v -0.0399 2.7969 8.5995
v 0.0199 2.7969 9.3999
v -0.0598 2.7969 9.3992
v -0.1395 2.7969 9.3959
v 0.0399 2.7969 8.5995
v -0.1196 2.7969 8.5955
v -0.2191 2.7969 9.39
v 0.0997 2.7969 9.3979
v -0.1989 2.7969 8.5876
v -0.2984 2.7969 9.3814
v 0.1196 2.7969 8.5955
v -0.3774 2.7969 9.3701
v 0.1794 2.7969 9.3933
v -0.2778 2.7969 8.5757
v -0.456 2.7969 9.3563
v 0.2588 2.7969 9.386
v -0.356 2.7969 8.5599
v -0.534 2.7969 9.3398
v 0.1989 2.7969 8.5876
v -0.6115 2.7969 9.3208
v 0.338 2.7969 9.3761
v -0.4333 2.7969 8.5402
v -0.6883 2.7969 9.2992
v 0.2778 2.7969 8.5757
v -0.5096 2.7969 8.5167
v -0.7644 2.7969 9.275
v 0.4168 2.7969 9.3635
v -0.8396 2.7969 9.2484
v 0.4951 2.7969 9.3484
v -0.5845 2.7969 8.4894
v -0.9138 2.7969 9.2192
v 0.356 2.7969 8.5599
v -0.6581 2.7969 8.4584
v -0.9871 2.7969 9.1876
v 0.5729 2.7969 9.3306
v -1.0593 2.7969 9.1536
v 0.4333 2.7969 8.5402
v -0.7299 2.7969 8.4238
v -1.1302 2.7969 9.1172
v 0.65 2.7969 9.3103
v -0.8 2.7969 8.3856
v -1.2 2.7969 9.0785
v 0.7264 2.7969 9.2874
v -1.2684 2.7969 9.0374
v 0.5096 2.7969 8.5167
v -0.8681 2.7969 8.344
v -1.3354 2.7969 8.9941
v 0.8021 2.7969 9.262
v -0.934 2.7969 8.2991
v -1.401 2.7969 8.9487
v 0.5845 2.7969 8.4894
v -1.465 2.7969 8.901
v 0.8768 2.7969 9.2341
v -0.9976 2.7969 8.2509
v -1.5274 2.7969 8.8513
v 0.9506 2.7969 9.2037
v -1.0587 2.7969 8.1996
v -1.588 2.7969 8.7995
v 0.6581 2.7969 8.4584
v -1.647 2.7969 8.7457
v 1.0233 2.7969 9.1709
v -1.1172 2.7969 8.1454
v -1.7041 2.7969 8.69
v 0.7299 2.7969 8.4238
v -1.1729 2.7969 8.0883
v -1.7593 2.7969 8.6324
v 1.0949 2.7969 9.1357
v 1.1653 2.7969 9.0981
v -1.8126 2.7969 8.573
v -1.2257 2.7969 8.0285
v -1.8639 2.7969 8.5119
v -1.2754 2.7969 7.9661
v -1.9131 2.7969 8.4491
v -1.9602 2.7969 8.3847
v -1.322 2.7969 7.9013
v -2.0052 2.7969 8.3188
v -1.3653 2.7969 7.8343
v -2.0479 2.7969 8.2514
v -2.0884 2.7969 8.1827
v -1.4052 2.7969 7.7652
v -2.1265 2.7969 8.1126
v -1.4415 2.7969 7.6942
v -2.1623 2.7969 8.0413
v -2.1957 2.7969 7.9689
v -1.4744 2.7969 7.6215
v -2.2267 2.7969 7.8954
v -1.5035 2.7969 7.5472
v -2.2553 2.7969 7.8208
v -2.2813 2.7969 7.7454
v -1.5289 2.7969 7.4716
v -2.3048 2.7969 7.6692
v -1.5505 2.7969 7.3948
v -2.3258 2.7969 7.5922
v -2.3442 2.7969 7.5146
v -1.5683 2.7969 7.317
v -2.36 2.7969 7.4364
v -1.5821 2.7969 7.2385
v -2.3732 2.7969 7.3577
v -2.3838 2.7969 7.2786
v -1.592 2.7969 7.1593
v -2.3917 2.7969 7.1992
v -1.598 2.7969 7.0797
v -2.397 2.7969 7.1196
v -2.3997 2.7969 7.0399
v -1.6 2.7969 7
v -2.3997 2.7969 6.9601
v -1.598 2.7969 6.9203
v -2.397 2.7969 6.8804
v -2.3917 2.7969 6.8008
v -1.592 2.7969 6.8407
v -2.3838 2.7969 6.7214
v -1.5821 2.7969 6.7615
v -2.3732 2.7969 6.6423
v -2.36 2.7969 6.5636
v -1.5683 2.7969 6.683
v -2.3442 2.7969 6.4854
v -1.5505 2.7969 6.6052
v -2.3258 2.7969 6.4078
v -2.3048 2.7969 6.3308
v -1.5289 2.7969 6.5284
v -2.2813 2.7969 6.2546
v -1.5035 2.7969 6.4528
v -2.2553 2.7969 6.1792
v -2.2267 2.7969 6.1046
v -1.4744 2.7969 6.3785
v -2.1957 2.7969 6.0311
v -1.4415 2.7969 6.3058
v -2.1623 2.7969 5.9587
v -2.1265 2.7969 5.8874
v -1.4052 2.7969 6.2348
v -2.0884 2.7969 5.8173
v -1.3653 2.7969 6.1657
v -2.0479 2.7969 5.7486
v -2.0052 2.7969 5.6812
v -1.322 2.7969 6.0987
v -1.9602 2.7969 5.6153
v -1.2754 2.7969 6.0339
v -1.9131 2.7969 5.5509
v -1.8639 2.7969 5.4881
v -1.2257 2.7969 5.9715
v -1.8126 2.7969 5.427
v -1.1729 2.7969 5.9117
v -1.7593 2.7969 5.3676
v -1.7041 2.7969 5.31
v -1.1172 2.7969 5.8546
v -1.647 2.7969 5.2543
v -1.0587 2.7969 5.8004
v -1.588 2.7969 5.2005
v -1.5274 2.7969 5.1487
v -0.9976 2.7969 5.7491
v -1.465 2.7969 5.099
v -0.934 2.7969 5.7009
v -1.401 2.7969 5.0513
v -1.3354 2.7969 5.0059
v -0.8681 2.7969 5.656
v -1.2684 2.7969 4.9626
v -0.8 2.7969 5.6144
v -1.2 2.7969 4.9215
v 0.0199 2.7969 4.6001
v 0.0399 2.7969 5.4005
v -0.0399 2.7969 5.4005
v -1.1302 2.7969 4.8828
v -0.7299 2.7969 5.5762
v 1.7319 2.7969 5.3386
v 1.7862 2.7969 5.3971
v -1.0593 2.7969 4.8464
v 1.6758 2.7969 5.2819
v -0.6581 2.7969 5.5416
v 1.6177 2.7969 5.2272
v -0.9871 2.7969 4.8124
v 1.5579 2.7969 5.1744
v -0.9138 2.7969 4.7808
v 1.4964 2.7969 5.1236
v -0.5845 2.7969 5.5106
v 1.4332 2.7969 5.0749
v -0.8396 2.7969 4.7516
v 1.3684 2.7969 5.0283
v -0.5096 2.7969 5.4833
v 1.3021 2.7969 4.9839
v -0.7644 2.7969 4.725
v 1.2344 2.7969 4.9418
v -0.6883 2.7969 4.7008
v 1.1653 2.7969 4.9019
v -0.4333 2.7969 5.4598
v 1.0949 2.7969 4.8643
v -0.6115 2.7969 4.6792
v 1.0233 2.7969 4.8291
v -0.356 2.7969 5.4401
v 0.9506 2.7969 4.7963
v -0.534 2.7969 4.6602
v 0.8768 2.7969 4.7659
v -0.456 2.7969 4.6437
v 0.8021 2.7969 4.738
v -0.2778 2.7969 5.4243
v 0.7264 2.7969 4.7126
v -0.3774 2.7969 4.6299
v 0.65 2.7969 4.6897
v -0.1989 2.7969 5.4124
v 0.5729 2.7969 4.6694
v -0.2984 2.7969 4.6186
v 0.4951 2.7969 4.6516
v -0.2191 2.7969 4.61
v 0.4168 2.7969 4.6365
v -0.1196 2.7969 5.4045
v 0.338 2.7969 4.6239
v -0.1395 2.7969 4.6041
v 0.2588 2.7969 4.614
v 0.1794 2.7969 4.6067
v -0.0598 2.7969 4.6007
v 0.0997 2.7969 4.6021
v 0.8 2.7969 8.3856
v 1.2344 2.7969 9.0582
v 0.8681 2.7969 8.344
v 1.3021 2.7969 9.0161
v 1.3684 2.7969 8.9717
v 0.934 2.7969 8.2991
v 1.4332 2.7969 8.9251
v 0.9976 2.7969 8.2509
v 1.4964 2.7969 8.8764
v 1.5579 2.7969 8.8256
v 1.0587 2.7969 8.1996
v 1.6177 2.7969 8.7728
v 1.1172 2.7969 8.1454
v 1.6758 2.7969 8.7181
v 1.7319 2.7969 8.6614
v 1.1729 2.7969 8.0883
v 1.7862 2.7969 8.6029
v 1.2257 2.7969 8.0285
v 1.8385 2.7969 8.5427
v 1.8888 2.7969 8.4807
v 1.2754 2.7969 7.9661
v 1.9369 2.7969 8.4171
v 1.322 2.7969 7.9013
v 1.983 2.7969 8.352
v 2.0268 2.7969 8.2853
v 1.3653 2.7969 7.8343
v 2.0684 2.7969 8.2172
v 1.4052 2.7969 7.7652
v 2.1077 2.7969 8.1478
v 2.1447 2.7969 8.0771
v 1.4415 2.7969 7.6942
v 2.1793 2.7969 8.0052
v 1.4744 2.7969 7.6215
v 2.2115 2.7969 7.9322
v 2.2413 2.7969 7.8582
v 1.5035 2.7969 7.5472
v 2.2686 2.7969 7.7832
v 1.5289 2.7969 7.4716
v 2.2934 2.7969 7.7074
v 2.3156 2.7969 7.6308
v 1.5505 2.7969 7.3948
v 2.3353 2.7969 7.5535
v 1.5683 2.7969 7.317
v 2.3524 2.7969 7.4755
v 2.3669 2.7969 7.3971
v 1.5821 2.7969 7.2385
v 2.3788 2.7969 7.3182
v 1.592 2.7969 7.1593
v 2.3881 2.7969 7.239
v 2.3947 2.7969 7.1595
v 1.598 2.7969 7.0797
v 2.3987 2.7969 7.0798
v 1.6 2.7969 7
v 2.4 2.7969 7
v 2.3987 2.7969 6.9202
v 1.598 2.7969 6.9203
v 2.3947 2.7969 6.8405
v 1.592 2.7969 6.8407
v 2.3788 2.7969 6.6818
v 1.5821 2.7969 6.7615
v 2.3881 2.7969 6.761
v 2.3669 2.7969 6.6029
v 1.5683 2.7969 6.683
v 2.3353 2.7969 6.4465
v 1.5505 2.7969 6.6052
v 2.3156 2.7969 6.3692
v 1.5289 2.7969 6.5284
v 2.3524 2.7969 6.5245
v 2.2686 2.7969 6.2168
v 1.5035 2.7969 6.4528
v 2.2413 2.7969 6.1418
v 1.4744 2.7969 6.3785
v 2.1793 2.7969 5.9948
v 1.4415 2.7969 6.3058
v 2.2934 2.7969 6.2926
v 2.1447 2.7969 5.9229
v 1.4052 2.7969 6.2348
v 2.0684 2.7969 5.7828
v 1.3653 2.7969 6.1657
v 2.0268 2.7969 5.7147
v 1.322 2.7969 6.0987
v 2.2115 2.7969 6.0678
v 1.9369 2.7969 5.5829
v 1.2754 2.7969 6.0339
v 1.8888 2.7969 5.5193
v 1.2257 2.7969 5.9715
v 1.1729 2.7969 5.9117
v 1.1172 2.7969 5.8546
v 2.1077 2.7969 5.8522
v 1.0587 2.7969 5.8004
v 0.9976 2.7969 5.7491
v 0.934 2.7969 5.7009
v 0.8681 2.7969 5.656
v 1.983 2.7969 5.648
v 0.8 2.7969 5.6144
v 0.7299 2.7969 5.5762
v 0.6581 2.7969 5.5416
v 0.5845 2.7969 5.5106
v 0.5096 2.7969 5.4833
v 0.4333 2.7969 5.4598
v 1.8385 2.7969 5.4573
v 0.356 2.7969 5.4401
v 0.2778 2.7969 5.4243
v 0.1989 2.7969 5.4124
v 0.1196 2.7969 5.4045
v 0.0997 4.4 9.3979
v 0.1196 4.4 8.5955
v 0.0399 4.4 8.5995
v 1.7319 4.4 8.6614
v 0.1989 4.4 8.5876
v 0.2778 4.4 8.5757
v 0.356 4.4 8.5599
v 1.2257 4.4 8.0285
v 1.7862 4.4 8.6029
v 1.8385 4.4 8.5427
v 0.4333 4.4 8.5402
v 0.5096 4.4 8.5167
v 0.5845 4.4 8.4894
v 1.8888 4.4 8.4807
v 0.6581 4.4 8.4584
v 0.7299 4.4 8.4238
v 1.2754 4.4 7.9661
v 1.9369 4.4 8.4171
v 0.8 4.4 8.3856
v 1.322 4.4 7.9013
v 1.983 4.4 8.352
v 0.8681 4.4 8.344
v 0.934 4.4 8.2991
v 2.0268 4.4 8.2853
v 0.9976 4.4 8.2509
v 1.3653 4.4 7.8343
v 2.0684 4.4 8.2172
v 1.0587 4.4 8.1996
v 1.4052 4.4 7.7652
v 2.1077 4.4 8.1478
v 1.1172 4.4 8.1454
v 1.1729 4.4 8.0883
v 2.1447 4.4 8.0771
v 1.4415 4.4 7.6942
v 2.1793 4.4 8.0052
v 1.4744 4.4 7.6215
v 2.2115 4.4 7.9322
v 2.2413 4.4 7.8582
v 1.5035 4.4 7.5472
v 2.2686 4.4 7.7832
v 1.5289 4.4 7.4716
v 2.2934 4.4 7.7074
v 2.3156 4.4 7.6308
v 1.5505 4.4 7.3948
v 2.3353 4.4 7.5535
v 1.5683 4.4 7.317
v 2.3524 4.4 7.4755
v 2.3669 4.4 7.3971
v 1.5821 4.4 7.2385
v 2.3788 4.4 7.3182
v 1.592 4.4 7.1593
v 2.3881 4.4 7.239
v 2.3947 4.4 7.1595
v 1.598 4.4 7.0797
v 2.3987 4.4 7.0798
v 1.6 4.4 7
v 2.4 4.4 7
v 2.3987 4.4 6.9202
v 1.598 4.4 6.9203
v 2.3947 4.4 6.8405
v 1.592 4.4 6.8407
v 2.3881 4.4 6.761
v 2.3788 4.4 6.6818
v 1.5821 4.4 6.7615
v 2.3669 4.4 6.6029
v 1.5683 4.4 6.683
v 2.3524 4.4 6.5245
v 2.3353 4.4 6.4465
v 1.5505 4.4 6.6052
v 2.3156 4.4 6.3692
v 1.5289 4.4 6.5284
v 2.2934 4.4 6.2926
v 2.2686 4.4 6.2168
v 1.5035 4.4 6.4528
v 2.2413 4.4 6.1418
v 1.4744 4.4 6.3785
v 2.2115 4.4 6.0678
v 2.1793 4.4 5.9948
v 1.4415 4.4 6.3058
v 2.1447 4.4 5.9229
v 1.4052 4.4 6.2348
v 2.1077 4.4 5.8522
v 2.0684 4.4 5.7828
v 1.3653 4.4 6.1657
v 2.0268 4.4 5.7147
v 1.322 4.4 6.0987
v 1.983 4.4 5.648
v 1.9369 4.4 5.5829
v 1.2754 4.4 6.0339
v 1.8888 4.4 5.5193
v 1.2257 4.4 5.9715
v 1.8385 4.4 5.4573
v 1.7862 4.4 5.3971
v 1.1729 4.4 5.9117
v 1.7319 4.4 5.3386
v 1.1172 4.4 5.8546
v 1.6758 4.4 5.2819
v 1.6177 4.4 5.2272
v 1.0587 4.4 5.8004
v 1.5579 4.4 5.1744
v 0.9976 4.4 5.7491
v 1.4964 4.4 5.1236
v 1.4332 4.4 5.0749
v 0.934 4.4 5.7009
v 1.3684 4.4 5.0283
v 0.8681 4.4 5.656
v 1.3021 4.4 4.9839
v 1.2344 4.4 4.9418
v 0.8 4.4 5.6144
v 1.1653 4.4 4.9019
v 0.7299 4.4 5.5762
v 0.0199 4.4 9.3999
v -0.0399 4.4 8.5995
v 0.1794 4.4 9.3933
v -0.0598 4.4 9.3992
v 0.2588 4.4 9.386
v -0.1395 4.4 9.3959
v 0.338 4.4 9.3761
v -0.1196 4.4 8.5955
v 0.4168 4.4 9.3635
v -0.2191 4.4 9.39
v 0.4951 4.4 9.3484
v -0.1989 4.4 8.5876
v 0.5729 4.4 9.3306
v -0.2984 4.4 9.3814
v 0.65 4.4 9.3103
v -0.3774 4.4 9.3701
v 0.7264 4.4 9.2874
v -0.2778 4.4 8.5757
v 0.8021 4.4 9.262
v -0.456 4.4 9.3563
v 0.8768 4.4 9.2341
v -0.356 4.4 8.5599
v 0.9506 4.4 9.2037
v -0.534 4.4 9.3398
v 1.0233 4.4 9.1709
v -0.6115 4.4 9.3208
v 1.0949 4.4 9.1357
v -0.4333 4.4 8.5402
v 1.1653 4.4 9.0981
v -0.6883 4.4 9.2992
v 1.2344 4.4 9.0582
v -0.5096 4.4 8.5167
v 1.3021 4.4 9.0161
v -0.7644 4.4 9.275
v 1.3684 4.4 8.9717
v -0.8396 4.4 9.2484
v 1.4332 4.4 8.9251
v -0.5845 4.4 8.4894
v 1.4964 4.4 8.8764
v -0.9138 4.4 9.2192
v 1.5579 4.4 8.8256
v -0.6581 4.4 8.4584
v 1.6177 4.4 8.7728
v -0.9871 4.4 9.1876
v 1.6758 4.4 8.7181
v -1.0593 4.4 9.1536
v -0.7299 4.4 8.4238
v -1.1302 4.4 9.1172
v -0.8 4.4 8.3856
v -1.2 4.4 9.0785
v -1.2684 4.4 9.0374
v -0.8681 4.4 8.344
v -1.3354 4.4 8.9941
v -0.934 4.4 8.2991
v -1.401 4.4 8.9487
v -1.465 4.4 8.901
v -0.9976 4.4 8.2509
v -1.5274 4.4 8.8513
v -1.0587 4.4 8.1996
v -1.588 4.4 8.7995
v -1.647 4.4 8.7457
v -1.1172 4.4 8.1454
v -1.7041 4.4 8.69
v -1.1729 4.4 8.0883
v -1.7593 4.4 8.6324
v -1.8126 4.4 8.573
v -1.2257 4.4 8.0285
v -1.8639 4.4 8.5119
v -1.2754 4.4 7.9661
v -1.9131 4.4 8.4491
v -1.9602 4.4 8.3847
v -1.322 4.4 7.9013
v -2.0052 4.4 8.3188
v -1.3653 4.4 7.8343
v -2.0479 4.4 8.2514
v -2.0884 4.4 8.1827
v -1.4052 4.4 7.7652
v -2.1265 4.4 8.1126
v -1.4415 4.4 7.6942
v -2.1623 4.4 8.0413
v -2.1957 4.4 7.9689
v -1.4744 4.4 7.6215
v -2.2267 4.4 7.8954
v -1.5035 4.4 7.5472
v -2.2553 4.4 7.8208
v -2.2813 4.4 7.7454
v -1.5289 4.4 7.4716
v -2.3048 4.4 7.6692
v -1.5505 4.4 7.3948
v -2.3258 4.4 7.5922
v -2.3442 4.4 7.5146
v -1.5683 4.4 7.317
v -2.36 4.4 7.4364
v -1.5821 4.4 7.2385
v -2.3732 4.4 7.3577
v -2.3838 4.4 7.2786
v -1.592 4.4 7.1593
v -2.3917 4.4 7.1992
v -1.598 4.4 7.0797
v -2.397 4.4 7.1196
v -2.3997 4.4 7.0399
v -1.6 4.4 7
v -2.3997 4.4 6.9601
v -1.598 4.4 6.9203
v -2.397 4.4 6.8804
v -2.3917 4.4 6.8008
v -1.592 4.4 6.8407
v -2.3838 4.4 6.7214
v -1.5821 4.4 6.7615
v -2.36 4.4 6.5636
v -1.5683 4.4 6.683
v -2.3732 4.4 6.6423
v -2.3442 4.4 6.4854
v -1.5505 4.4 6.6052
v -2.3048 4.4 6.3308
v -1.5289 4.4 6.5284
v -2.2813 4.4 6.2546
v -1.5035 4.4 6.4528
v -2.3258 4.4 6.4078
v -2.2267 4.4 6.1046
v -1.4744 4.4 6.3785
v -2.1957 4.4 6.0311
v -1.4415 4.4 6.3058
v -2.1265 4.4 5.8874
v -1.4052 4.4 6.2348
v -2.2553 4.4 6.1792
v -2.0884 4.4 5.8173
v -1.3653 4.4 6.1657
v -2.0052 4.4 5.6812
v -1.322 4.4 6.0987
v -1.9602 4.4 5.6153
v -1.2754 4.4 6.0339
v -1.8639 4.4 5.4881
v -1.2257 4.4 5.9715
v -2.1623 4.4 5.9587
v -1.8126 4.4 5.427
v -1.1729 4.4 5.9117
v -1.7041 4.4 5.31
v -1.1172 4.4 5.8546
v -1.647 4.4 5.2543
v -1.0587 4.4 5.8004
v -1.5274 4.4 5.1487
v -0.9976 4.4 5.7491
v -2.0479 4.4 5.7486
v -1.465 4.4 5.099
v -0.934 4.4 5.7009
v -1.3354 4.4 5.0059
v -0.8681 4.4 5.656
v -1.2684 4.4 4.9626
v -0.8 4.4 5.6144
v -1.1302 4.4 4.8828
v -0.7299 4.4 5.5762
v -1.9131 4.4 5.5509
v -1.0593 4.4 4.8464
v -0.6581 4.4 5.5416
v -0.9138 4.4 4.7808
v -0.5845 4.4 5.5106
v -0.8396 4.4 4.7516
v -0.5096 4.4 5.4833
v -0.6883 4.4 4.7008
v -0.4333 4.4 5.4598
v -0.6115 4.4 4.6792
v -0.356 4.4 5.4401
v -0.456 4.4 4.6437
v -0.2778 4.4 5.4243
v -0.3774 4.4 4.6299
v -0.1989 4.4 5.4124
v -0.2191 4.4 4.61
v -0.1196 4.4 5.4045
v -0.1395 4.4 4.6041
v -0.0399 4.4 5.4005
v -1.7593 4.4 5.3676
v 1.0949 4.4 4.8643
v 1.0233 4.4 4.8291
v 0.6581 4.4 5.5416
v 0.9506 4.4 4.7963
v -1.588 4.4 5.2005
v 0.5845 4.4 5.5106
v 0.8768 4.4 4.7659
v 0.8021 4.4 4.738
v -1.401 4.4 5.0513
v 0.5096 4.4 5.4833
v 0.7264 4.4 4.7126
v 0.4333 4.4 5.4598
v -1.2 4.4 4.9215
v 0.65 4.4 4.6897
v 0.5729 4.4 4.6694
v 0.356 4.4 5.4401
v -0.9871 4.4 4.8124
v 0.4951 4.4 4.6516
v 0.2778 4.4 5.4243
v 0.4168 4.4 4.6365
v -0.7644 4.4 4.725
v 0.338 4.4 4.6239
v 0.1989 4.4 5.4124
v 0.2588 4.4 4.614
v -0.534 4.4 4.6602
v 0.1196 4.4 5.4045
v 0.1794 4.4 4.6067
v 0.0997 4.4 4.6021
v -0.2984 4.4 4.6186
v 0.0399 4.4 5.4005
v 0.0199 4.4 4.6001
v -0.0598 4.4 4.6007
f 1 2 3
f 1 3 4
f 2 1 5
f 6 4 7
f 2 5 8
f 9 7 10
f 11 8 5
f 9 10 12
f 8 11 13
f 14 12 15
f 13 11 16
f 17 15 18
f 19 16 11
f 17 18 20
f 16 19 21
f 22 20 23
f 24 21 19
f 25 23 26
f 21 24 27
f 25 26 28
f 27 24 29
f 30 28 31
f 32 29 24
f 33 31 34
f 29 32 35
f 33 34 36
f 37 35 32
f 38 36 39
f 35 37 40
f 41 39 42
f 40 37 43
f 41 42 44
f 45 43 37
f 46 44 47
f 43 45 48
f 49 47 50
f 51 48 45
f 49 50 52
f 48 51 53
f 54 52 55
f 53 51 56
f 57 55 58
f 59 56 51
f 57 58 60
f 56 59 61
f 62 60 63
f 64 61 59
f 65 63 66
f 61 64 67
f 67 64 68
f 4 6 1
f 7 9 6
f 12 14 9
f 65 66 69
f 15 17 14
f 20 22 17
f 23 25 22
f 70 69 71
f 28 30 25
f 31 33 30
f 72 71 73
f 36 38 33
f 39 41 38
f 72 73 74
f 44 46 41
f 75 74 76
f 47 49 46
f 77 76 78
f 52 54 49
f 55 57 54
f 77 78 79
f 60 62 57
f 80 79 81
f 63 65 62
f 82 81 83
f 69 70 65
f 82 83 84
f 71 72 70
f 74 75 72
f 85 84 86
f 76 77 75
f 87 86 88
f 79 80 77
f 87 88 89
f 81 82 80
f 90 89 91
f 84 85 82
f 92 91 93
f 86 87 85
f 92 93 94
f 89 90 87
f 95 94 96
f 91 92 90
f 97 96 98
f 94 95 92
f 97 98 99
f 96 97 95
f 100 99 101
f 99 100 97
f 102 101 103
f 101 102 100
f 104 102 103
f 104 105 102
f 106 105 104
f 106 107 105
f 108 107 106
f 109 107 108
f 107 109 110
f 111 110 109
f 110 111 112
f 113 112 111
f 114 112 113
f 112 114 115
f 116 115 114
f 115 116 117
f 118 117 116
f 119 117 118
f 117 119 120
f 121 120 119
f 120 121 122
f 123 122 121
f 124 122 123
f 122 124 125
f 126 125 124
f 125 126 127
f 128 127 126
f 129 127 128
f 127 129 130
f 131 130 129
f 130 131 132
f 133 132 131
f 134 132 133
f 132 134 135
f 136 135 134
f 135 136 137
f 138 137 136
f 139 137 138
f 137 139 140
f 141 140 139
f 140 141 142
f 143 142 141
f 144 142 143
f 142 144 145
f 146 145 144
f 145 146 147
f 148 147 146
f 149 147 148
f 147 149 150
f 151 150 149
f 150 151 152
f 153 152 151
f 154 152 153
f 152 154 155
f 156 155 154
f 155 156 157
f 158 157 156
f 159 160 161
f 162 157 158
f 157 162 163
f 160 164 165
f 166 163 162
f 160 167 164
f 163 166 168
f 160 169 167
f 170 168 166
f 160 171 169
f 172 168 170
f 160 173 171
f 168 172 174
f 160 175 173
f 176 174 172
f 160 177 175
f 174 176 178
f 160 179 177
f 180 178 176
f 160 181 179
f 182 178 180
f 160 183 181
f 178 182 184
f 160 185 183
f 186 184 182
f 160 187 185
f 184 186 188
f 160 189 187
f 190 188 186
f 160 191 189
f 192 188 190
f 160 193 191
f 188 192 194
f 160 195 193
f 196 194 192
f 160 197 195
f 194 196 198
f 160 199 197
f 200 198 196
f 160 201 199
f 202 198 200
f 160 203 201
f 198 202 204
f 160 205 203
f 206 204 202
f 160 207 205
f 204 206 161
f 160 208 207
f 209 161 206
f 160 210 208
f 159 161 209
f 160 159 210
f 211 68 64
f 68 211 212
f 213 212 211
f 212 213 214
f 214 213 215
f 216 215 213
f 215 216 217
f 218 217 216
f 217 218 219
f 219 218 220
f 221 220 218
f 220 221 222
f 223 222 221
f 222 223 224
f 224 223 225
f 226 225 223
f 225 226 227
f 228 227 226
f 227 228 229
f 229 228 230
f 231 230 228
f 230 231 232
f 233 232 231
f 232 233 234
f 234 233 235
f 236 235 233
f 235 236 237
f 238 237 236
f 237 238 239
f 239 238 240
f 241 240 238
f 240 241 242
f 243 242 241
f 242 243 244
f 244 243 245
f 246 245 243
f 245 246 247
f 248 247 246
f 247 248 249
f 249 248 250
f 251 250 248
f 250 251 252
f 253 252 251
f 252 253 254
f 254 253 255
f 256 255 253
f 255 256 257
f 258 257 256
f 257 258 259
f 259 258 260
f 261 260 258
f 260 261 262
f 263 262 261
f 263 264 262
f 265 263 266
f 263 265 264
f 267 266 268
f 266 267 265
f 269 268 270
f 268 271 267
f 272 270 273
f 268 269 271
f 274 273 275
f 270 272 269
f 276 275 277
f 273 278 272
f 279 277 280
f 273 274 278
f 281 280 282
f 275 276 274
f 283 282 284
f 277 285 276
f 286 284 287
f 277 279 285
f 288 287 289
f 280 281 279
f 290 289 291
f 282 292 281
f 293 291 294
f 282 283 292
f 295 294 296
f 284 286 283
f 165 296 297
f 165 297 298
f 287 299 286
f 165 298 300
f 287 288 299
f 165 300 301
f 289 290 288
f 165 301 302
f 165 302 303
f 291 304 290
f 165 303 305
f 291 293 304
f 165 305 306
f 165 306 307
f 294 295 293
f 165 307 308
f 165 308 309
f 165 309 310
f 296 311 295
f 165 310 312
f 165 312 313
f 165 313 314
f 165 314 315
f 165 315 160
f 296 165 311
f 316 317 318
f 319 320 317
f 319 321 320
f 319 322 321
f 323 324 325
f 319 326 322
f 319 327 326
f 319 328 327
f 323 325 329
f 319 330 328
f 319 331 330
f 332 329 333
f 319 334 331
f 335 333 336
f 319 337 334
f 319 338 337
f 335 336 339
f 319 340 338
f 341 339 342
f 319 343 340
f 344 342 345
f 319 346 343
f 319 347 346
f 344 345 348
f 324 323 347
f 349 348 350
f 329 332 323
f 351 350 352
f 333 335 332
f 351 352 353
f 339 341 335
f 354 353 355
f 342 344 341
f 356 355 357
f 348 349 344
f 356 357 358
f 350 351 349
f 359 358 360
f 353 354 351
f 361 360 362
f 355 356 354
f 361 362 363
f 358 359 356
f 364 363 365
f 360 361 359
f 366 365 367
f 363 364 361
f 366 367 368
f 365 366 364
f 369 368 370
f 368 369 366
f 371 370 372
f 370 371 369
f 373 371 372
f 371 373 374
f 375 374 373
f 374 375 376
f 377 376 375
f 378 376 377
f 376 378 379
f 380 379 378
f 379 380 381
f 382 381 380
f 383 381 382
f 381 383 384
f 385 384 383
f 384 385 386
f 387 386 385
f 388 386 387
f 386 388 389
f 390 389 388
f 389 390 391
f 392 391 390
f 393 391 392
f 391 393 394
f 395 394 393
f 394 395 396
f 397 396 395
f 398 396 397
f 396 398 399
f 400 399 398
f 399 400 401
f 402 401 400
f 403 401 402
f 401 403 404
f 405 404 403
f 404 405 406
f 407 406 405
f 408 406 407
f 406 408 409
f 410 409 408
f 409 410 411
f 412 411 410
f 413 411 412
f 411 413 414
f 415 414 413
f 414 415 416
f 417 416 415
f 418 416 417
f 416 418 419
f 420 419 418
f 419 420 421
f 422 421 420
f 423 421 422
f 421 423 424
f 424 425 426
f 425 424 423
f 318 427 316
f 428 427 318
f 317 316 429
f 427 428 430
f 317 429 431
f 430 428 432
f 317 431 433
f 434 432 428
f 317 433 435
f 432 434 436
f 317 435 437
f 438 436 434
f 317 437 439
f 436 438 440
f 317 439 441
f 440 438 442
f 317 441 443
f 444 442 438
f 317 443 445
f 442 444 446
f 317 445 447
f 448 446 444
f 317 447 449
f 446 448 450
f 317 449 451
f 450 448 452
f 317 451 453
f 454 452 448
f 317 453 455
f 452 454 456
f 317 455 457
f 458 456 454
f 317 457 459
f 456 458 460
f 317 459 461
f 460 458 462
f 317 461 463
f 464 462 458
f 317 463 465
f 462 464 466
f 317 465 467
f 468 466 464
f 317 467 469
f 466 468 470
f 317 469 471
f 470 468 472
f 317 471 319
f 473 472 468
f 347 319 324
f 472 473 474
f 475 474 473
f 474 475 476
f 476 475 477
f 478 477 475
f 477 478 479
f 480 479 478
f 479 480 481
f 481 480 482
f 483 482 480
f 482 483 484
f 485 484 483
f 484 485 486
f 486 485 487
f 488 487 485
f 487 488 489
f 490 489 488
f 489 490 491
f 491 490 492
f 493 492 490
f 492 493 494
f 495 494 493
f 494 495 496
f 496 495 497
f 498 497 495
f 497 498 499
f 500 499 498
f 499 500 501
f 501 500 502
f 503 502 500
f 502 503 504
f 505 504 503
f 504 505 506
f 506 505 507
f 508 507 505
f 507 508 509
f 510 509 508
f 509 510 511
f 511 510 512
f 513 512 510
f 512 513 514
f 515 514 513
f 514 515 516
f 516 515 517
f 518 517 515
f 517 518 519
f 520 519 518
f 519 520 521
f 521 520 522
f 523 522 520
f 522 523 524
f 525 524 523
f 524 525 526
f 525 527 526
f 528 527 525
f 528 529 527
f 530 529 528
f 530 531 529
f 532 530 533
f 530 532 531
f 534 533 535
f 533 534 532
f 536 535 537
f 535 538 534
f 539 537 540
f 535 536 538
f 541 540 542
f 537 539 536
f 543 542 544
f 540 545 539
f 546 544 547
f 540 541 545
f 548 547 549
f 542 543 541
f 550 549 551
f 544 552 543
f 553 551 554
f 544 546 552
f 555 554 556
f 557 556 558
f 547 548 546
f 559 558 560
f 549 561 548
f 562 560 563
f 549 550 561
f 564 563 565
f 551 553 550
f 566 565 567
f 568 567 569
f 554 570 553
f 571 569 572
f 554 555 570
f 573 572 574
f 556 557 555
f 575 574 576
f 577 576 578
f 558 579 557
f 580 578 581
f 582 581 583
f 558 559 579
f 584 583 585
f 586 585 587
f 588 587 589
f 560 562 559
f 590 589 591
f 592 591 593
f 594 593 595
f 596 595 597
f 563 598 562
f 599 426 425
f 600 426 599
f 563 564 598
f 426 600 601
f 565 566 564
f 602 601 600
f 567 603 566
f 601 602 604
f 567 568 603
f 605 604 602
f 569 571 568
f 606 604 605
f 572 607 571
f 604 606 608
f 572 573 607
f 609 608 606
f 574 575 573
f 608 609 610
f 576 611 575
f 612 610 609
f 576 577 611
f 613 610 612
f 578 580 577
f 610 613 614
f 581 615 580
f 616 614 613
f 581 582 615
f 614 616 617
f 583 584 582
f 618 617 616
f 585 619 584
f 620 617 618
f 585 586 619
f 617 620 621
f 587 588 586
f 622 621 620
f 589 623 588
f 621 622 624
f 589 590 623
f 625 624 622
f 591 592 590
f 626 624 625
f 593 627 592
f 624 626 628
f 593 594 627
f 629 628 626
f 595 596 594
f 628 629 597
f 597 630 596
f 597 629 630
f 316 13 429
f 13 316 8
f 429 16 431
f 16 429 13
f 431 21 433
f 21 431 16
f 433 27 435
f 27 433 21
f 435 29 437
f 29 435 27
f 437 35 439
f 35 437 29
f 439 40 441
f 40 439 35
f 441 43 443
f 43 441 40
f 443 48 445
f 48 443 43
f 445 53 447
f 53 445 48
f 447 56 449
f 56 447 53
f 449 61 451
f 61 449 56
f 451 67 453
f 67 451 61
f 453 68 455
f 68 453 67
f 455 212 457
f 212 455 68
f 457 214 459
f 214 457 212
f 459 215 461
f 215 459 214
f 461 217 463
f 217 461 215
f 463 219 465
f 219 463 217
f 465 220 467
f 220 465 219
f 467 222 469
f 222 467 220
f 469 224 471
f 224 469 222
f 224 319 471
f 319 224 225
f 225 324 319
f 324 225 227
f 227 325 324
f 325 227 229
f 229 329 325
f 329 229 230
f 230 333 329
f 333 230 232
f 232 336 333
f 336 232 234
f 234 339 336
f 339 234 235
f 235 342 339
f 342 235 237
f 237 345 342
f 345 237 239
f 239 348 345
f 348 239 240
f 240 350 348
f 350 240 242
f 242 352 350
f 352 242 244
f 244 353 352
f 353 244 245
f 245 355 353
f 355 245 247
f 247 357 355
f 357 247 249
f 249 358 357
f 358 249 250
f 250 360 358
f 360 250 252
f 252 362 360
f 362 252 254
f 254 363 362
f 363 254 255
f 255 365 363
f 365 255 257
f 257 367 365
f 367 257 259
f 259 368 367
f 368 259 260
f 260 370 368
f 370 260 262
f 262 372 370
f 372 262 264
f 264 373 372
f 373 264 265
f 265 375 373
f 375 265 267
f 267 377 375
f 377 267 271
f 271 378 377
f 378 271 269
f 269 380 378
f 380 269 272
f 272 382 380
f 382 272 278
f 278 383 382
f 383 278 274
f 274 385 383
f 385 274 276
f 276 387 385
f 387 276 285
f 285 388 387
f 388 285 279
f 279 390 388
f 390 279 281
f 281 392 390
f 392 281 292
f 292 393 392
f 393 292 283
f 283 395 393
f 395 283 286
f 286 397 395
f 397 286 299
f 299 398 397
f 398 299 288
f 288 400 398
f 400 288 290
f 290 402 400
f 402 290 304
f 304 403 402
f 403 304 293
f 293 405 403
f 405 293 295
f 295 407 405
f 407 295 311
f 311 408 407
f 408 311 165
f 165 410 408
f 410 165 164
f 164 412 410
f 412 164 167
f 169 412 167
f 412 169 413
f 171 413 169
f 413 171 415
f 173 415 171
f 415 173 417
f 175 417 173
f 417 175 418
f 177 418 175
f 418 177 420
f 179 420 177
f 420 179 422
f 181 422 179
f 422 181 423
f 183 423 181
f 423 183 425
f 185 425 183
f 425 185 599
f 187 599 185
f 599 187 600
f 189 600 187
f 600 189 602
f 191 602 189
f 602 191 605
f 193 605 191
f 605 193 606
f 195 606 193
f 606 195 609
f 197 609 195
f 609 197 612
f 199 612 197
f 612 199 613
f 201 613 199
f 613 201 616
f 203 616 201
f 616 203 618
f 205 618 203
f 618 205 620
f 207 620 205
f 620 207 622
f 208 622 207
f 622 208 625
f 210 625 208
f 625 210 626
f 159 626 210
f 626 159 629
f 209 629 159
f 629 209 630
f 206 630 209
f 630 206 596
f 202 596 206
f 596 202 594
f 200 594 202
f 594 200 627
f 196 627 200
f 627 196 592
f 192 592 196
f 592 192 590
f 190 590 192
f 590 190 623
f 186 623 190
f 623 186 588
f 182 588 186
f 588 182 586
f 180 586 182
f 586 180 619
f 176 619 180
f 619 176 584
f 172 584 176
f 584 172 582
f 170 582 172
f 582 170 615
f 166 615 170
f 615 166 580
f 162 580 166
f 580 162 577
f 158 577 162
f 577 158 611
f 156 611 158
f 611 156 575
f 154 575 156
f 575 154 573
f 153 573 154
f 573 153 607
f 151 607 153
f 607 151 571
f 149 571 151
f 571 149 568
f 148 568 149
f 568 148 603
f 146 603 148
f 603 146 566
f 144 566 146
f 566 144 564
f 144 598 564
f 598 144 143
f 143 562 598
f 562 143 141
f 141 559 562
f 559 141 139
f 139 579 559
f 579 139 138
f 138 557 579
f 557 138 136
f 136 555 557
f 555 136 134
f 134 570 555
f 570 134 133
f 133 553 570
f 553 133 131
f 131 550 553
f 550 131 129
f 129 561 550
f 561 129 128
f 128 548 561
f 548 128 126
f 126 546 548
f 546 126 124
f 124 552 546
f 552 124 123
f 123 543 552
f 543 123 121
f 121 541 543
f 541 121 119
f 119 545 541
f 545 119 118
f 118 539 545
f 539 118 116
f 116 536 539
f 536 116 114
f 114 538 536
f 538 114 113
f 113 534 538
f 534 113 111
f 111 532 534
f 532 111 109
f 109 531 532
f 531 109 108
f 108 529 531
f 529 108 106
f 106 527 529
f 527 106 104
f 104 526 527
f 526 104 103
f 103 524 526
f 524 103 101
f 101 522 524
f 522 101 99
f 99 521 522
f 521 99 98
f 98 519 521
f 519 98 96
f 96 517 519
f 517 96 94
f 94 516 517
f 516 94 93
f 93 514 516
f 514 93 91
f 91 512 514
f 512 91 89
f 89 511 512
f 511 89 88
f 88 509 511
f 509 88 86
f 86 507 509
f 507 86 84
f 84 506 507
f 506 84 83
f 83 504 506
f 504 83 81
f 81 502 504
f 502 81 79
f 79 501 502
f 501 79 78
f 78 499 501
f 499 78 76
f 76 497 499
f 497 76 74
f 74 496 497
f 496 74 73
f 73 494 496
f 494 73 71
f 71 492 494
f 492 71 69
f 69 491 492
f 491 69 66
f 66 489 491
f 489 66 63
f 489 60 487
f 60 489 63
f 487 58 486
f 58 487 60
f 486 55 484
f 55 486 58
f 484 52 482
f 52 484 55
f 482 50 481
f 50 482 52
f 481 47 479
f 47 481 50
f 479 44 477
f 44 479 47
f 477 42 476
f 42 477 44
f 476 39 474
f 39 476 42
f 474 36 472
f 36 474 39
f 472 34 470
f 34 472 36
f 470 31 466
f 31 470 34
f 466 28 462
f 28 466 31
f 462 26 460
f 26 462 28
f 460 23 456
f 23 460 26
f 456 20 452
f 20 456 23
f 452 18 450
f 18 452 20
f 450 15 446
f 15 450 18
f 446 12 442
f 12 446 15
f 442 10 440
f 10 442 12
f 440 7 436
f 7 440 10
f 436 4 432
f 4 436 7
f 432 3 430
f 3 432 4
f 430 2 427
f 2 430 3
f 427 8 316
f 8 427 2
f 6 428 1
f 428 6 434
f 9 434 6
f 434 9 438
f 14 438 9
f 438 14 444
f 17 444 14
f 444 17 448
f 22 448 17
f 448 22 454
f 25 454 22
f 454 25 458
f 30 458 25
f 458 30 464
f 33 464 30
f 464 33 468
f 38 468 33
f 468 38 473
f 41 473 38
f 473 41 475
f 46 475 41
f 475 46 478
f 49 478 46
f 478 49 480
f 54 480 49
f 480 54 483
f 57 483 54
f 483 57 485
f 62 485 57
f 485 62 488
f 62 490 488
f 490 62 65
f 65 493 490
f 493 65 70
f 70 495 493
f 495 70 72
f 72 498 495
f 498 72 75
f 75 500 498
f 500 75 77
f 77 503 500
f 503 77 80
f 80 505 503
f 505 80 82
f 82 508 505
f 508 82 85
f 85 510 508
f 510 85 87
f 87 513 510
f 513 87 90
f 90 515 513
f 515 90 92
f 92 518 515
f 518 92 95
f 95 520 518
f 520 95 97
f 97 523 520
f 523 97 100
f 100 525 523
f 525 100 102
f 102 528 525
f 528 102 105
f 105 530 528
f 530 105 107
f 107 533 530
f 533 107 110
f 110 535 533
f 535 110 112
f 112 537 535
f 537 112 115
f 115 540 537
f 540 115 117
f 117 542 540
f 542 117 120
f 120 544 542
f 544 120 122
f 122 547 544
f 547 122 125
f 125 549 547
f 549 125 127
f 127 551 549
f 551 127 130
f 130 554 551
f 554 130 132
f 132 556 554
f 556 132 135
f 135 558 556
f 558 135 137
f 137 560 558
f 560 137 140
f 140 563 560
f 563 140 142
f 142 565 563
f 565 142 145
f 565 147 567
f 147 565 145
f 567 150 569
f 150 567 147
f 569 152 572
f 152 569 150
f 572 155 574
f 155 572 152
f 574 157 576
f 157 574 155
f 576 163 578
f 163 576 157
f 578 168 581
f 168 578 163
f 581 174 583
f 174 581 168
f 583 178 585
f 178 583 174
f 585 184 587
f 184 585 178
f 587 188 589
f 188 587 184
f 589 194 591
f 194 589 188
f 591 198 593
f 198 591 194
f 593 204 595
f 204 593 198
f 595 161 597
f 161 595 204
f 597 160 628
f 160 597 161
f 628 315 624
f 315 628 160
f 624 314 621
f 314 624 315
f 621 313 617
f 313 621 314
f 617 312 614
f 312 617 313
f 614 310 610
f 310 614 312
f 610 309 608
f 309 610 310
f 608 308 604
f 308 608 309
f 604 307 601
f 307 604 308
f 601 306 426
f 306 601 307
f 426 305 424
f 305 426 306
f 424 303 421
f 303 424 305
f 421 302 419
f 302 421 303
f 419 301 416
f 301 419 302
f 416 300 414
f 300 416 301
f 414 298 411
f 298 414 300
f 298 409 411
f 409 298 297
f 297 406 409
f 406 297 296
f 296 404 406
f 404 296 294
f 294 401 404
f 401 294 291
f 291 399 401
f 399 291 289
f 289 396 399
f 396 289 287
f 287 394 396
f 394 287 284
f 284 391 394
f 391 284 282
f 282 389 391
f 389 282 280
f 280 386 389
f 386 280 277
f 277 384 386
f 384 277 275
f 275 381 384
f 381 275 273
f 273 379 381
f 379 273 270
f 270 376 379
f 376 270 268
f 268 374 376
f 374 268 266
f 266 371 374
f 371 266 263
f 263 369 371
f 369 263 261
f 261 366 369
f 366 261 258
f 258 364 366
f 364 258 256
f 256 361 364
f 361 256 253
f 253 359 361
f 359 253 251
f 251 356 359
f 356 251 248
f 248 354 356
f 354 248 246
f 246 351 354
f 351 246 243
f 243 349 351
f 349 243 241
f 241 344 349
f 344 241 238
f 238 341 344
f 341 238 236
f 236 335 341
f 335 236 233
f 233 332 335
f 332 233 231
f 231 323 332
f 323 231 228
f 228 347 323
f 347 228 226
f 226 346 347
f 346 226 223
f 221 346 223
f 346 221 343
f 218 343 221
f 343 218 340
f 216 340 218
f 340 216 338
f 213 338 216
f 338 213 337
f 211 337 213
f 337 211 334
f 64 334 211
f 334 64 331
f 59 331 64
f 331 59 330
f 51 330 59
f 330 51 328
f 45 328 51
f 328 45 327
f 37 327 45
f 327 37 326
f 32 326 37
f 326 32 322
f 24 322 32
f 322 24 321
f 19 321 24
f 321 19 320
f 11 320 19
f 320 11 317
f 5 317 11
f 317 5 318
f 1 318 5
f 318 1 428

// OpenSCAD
use <../lib.scad>
use <s/30375s01.scad>
use <s/30375s02.scad>
use <s/30375s03.scad>
$fa=1; $fs=0.2;
function ldraw_lib__30375ps3(realsolid=false) = [
// 0 Minifig Mechanical Torso with Blue Insignia Pattern
// 0 Name: 30375ps3.dat
// 0 Author: Franklin W. Cain [fwcain]
// 0 !LDRAW_ORG Part UPDATE 2002-05
// 0 !LICENSE Licensed under CC BY 2.0 and CC BY 4.0 : see CAreadme.txt
// 
// 0 BFC CERTIFY CCW
  [0,"BFC","CERTIFY"],
  [0,"BFC","CCW"],
// 
// 0 !KEYWORDS Attack of the Clones, blue droid, Episode 1, Episode 2
// 0 !KEYWORDS minifig-scale, pilot, set 7126, Star Wars, The Phantom Menace
// 0 !KEYWORDS Trade Federation
// 
// 0 !CMDLINE -c487
// 
// 0 !HISTORY 2002-11-30 [PTadmin] Official Update 2002-05
// 0 !HISTORY 2007-06-09 [PTadmin] Header formatted for Contributor Agreement
// 0 !HISTORY 2008-07-01 [PTadmin] Official Update 2008-01
// 
// 
// 1 16 0 0 0 1 0 0 0 1 0 0 0 1 s\30375s01.dat
  [1,16,0,0,0,1,0,0,0,1,0,0,0,1, ldraw_lib__s__30375s01(realsolid)],
// 1 1 0 0 0 1 0 0 0 1 0 0 0 1 s\30375s02.dat
  [1,1,0,0,0,1,0,0,0,1,0,0,0,1, ldraw_lib__s__30375s02(realsolid)],
// 1 1 0 0 0 1 0 0 0 1 0 0 0 1 s\30375s03.dat
  [1,1,0,0,0,1,0,0,0,1,0,0,0,1, ldraw_lib__s__30375s03(realsolid)],
// 0
];
module ldraw_lib__30375ps3(step=0, col=false, unit=2/5, alt=false, line=0.2, solid=!$preview)
    makepoly(ldraw_lib__30375ps3(solid), step=step, col=col, unit=unit, alt=alt, line=line, solid=solid);
ldraw_lib__30375ps3(line=0.2);
